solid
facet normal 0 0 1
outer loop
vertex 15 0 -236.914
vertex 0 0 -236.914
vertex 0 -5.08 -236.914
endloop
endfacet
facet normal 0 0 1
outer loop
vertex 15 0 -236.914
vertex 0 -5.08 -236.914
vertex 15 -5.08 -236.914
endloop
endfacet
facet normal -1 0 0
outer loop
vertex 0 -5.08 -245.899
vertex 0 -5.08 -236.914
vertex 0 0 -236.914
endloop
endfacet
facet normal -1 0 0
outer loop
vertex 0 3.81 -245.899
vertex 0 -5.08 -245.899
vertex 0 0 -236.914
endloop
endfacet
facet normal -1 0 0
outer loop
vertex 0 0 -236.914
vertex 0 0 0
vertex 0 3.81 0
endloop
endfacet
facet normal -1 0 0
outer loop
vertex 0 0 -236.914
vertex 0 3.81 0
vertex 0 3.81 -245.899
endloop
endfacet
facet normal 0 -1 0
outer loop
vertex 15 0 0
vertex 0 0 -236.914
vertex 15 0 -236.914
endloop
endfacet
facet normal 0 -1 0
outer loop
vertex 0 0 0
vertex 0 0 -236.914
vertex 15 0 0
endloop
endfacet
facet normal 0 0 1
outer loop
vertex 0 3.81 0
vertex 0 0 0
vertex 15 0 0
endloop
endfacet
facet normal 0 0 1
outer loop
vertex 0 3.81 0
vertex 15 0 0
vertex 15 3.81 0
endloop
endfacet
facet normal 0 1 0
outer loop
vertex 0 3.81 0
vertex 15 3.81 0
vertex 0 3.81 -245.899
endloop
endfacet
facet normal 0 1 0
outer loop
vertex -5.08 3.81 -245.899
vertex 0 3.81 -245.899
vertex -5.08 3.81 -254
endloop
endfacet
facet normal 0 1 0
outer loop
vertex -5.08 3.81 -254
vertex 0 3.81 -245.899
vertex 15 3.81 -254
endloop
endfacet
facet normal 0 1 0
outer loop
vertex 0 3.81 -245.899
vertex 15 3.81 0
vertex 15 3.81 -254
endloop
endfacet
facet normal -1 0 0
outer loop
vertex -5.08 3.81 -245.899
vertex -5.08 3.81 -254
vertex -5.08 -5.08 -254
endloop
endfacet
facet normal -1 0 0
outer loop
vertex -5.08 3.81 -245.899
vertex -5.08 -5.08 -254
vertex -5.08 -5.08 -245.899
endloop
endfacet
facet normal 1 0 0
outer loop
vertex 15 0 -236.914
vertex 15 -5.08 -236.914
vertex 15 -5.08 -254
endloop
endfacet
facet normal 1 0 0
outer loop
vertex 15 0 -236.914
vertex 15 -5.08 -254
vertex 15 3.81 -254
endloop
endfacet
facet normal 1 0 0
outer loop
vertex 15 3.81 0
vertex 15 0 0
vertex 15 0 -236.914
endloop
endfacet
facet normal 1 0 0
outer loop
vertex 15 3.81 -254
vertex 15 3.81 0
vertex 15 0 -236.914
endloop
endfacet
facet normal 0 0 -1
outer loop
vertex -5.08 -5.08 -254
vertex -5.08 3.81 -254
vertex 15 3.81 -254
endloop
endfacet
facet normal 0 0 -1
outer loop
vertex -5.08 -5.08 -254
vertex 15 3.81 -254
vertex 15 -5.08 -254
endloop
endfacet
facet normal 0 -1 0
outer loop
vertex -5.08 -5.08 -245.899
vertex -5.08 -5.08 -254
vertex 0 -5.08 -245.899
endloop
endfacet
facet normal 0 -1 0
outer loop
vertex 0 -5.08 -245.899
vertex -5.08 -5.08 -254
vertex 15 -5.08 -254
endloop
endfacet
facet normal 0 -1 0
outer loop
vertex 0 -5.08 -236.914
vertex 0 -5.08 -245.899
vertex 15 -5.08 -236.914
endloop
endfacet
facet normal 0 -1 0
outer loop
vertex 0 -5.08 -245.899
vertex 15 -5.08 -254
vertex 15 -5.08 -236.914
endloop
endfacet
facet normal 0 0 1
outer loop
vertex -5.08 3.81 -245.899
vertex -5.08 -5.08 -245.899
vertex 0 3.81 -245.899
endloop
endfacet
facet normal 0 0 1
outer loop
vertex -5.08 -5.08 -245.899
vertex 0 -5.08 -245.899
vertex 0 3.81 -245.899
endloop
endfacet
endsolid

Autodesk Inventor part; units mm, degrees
ref_plane "YZ Plane" through (0, 0, 0) normal (1, 0, 0) x (0, 1, 0)
ref_plane "XZ Plane" through (0, 0, 0) normal (0, 1, 0) x (-1, 0, 0)
ref_plane "XY Plane" through (0, 0, 0) normal (0, 0, 1) x (1, 0, 0)
sketch "Sketch1" plane through (0, 0, 0) normal (1, 0, 0) x (0, 1, 0)
  line L0 (0, 0) -> (3.81, 0)
  line L1 (3.81, 0) -> (3.81, -254)
  line L2 (3.81, -254) -> (0, -254)
  line L3 (0, -254) -> (0, 0)
  dimension "d0" = 254
  dimension "d1" = 3.81
extrude "Extrusion1" add sketch "Sketch1" along normal blind 15
sketch "Sketch2" plane through (0, 0, -254) normal (0, -1, 0) x (1, 0, 0)
  line L0 (15, 254) -> (15, 0) projected
  line L1 (0, 0) -> (0, 254) projected
  line L2 (15, 0) -> (0, 0)
  line L3 (0, 0) -> (0, 17.0864)
  line L4 (0, 17.0864) -> (15, 17.0864)
  line L5 (15, 17.0864) -> (15, 0)
  dimension "d4" = 17.0864
extrude "Extrusion2" add sketch "Sketch2" along normal blind 5.08
sketch "Sketch3" plane through (0, 0, 0) normal (-1, 0, 0) x (0, 0, 1)
  line L0 (-254, 3.81) -> (-254, -5.08) projected
  line L1 (0, 3.81) -> (-254, 3.81) projected
  line L2 (-254, -5.08) -> (-245.8991, -5.08)
  line L3 (-245.8991, -5.08) -> (-245.8991, 3.81)
  line L4 (-245.8991, 3.81) -> (-254, 3.81)
  line L5 (-254, 3.81) -> (-254, -5.08)
  point P0 (0, 0)
  dimension "d7" = 8.1008
extrude "Extrusion3" add sketch "Sketch3" along normal blind 5.08
properties part number "rails"
